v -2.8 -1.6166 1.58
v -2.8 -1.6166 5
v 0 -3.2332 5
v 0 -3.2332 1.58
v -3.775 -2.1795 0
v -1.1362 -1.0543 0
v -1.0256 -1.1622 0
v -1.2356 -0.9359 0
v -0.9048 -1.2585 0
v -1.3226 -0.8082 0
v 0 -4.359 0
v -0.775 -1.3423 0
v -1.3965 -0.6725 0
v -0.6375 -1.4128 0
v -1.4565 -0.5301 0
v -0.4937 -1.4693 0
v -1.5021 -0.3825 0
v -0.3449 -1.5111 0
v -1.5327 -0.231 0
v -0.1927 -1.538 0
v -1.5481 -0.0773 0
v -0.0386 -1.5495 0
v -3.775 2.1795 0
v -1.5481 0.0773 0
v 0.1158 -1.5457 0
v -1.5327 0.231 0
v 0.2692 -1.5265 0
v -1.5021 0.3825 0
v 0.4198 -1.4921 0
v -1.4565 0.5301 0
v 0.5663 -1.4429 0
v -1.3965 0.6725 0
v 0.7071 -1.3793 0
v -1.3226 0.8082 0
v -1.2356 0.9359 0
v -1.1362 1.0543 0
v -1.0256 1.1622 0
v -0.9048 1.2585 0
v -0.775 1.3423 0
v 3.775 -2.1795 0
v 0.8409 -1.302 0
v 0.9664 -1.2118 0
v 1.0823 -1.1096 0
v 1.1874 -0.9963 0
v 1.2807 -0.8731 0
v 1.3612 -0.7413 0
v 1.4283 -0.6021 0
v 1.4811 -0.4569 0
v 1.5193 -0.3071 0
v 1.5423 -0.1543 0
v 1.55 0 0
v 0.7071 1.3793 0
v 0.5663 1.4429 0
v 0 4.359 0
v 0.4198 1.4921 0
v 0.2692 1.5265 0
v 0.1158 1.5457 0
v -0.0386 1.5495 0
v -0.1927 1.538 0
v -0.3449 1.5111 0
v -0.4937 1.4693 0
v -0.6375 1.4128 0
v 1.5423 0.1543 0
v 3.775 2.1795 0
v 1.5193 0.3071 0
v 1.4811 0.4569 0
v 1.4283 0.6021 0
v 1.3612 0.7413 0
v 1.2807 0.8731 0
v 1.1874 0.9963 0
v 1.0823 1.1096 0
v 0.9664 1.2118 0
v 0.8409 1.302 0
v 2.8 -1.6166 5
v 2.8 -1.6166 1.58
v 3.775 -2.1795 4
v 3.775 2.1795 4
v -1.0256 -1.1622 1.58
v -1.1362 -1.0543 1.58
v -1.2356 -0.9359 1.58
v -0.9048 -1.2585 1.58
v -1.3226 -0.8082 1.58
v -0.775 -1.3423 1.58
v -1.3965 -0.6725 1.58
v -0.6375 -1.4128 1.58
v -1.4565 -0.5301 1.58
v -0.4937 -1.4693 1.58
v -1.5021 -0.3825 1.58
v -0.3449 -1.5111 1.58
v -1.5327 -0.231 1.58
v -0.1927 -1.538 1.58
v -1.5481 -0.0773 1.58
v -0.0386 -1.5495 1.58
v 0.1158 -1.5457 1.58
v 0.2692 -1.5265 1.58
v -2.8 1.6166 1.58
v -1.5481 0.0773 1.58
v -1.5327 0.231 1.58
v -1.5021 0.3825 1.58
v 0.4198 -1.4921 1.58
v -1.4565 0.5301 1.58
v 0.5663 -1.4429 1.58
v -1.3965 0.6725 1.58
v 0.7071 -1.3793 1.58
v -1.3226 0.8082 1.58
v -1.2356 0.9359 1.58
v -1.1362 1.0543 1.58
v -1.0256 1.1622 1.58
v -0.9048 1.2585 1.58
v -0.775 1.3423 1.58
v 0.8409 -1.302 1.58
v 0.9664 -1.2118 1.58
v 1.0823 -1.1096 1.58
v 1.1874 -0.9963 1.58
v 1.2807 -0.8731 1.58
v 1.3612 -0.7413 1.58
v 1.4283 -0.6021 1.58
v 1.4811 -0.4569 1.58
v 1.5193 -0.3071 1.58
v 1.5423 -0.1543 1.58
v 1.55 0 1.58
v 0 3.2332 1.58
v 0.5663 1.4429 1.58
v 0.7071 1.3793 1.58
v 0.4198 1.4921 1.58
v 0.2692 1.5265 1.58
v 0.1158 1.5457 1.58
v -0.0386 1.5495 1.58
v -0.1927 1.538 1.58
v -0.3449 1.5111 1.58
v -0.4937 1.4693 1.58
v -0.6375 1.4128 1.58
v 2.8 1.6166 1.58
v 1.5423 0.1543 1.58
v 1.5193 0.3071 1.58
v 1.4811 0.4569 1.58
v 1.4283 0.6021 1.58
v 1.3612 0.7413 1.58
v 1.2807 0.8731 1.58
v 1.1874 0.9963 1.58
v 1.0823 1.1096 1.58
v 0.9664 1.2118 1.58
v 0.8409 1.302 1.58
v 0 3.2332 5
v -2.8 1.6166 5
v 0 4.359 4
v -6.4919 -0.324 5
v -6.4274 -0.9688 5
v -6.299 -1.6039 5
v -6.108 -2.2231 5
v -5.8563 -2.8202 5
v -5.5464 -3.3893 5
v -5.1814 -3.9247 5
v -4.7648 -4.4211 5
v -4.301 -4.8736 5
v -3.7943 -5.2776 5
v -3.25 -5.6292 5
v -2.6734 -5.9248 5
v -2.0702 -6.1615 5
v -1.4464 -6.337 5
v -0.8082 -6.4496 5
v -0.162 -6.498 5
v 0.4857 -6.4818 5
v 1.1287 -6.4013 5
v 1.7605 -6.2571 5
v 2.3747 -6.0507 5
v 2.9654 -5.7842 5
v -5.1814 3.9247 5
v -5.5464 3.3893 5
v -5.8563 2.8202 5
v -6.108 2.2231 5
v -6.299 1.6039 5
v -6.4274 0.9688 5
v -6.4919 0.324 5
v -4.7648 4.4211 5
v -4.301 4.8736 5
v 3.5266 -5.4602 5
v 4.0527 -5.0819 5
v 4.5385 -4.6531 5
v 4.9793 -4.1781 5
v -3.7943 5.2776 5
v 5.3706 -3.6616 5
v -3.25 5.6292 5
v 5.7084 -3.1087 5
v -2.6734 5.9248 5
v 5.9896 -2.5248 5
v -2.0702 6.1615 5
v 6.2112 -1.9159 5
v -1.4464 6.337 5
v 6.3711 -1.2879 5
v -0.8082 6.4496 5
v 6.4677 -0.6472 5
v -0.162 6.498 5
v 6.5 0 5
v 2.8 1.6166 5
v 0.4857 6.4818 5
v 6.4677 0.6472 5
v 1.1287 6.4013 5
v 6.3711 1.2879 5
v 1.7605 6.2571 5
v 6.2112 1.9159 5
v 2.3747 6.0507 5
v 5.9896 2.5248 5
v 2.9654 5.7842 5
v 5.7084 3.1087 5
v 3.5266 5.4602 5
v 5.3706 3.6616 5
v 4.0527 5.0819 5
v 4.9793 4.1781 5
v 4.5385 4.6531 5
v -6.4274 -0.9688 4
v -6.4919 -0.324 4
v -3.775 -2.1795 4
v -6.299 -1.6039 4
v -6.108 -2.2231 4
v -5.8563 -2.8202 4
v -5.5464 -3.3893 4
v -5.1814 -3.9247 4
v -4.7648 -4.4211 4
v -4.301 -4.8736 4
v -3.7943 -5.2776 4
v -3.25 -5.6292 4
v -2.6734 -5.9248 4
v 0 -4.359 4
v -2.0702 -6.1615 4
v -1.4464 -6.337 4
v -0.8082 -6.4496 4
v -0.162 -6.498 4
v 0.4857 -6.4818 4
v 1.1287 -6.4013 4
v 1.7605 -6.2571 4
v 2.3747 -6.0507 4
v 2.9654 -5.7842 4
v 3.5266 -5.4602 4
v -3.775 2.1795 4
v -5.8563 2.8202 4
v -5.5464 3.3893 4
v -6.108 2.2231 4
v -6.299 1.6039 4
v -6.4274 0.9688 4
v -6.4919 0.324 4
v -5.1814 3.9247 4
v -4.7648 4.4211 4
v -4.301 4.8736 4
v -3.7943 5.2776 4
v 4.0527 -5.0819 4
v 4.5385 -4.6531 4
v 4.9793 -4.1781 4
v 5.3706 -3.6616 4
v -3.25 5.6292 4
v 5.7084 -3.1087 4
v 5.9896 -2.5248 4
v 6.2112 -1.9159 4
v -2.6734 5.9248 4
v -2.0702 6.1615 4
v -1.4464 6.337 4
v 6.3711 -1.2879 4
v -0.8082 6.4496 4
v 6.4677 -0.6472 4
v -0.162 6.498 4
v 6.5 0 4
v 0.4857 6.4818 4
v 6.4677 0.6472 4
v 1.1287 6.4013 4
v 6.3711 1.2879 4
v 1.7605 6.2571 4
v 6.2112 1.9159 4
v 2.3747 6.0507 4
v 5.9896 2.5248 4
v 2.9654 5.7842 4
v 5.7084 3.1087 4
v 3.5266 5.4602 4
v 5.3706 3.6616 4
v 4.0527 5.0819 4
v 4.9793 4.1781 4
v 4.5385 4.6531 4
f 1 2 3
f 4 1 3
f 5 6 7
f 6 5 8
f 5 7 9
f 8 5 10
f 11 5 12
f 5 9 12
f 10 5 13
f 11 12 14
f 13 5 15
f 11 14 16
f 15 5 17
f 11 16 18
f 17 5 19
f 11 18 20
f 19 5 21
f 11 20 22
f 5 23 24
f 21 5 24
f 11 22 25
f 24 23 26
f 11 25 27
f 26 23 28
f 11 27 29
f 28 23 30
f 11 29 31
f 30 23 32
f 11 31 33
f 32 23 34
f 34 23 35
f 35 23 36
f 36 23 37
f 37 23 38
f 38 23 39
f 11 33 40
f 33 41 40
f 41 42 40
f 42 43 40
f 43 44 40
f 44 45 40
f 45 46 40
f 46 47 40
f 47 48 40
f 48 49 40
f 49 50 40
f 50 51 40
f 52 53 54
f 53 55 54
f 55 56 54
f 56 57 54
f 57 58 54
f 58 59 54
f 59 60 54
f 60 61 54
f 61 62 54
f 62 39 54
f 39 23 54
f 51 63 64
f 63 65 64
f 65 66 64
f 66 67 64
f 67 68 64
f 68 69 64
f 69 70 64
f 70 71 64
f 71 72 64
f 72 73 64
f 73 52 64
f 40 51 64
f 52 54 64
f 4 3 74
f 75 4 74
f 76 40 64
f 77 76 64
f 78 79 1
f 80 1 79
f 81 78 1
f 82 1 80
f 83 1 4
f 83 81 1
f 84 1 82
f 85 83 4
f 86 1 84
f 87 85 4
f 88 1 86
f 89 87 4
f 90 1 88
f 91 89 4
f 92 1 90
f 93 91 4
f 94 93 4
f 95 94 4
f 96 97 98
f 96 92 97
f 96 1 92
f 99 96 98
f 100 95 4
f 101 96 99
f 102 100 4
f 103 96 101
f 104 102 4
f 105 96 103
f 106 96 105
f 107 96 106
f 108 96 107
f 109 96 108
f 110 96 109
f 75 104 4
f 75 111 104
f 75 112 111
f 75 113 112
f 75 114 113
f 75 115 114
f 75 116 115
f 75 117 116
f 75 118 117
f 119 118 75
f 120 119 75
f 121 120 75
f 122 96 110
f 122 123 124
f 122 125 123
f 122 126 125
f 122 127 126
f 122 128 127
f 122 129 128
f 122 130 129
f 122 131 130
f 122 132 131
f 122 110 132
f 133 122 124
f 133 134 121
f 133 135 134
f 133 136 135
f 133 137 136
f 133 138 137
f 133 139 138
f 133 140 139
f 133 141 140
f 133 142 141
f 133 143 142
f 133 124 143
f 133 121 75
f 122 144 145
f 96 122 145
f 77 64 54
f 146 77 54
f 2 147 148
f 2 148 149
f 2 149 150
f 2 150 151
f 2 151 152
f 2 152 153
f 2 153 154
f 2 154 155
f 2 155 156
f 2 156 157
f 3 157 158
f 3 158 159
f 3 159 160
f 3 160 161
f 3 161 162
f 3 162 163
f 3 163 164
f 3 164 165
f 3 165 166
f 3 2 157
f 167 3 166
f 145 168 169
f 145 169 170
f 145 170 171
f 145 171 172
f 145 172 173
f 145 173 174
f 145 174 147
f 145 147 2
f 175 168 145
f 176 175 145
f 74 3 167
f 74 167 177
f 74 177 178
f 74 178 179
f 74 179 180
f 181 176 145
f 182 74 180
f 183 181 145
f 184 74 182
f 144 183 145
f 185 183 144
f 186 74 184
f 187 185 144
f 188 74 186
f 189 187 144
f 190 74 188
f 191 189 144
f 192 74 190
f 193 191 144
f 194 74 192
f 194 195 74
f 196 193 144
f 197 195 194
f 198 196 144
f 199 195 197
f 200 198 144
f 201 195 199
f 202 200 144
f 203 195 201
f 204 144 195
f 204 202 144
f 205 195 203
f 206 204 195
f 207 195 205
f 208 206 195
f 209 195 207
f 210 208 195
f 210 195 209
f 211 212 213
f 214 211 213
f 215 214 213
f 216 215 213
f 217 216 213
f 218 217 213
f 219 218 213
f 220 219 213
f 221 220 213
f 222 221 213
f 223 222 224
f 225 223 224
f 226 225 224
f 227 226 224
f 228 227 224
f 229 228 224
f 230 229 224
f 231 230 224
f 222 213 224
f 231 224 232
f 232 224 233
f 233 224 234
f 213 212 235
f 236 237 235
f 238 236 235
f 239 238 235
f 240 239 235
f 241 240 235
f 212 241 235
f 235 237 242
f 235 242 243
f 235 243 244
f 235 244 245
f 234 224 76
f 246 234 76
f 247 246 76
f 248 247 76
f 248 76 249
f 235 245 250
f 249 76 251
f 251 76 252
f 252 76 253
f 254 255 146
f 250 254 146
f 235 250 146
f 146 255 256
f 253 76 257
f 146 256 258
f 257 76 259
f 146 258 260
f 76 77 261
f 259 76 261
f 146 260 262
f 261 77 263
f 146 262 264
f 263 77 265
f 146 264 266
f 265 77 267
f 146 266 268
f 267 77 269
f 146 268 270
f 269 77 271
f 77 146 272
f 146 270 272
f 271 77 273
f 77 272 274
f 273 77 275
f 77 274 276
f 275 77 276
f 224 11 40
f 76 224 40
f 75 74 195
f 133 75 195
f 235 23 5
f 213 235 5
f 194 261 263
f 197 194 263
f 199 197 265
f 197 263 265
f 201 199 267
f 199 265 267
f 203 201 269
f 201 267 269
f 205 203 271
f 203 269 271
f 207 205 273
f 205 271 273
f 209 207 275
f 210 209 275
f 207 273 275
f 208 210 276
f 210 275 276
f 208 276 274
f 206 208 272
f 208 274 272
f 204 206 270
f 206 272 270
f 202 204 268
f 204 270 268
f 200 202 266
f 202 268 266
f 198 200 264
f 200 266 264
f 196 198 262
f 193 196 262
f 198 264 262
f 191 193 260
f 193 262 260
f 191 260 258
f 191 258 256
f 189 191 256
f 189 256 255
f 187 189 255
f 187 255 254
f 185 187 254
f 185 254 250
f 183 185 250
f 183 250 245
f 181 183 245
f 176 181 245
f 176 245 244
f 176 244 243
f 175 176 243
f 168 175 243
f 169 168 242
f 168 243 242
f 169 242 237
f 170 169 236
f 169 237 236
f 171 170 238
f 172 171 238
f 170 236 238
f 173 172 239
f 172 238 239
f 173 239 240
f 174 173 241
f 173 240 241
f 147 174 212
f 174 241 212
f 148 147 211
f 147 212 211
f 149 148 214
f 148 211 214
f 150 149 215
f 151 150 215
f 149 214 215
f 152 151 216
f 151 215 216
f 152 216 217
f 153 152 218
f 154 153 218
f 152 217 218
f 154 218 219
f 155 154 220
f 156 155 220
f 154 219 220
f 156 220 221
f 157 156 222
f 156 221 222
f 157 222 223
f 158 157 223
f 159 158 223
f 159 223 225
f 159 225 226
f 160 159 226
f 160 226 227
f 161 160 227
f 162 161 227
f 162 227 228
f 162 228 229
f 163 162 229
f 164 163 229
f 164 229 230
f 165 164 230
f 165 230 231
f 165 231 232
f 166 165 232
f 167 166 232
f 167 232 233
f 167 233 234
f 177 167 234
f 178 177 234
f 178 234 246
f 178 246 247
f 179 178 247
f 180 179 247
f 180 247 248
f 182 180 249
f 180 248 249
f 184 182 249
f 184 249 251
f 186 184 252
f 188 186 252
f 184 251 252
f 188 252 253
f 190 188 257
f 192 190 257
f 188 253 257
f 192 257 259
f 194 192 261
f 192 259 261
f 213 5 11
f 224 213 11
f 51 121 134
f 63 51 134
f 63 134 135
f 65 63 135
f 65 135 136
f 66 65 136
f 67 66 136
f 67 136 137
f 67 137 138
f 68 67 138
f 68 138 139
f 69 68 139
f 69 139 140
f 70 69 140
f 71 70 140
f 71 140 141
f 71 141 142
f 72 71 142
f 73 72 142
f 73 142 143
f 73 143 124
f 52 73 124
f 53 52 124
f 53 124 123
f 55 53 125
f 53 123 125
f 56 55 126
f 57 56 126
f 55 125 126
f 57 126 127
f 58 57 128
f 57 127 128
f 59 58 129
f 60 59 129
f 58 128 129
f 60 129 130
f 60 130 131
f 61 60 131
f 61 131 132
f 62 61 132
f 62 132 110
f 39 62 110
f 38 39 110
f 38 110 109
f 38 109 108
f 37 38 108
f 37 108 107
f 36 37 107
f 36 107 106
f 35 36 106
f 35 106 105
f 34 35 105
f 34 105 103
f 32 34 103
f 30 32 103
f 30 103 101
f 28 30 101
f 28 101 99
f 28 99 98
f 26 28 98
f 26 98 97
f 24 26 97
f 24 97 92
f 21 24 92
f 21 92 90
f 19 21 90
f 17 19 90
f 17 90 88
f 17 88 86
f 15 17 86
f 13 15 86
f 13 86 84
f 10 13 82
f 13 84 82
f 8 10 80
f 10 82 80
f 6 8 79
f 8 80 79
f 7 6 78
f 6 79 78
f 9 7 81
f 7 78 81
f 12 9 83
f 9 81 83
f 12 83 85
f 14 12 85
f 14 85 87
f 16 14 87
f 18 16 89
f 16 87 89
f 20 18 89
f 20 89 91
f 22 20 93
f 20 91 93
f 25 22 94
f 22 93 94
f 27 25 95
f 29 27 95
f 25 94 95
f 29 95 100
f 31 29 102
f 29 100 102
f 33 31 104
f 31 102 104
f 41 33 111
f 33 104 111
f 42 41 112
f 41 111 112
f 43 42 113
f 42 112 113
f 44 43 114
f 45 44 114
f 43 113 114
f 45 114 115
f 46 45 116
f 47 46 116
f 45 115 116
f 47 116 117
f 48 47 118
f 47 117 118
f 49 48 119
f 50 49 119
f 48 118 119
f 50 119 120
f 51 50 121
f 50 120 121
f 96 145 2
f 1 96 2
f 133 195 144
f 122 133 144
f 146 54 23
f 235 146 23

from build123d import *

# Parameters (mm, degrees)
F1_DEPTH = 4
F3_DEPTH = 2.42
F4_R     = 1.55
F5_DEPTH = 25
F6_R     = 6.5
F7_DEPTH = 1
F9_DEPTH = 1.8


with BuildPart() as f1:
    # F0 (on Top) → F1 (new body)
    with BuildSketch(Plane.XY):
        Polygon((3.775, -2.179497), (3.775, 2.179497), (0, 4.358995), (-3.775, 2.179497), (-3.775, -2.179497), (0, -4.358995), align=None)
    extrude(amount=F1_DEPTH)

    # F2 (on face) → F3 (cut)
    with BuildSketch(Plane.XY.offset(4)):
        Polygon((2.8, -1.616581), (2.8, 1.616581), (0, 3.233162), (-2.8, 1.616581), (-2.8, -1.616581), (0, -3.233162), align=None)
    extrude(amount=-F3_DEPTH, mode=Mode.SUBTRACT)

    # F4 (on face) → F5 (cut)
    with BuildSketch(Plane.XY.offset(1.58)):
        Circle(F4_R)
    extrude(amount=-F5_DEPTH, mode=Mode.SUBTRACT)

    # F6 (on face) → F7 (join)
    with BuildSketch(Plane.XY.offset(4)):
        Circle(F6_R)
    extrude(amount=F7_DEPTH)

    # F8 (on face) → F9 (cut)
    with BuildSketch(Plane.XY.offset(5)):
        Polygon((2.8, -1.616581), (2.8, 1.616581), (0, 3.233162), (-2.8, 1.616581), (-2.8, -1.616581), (0, -3.233162), align=None)
    extrude(amount=-F9_DEPTH, mode=Mode.SUBTRACT)


solid = f1.part
